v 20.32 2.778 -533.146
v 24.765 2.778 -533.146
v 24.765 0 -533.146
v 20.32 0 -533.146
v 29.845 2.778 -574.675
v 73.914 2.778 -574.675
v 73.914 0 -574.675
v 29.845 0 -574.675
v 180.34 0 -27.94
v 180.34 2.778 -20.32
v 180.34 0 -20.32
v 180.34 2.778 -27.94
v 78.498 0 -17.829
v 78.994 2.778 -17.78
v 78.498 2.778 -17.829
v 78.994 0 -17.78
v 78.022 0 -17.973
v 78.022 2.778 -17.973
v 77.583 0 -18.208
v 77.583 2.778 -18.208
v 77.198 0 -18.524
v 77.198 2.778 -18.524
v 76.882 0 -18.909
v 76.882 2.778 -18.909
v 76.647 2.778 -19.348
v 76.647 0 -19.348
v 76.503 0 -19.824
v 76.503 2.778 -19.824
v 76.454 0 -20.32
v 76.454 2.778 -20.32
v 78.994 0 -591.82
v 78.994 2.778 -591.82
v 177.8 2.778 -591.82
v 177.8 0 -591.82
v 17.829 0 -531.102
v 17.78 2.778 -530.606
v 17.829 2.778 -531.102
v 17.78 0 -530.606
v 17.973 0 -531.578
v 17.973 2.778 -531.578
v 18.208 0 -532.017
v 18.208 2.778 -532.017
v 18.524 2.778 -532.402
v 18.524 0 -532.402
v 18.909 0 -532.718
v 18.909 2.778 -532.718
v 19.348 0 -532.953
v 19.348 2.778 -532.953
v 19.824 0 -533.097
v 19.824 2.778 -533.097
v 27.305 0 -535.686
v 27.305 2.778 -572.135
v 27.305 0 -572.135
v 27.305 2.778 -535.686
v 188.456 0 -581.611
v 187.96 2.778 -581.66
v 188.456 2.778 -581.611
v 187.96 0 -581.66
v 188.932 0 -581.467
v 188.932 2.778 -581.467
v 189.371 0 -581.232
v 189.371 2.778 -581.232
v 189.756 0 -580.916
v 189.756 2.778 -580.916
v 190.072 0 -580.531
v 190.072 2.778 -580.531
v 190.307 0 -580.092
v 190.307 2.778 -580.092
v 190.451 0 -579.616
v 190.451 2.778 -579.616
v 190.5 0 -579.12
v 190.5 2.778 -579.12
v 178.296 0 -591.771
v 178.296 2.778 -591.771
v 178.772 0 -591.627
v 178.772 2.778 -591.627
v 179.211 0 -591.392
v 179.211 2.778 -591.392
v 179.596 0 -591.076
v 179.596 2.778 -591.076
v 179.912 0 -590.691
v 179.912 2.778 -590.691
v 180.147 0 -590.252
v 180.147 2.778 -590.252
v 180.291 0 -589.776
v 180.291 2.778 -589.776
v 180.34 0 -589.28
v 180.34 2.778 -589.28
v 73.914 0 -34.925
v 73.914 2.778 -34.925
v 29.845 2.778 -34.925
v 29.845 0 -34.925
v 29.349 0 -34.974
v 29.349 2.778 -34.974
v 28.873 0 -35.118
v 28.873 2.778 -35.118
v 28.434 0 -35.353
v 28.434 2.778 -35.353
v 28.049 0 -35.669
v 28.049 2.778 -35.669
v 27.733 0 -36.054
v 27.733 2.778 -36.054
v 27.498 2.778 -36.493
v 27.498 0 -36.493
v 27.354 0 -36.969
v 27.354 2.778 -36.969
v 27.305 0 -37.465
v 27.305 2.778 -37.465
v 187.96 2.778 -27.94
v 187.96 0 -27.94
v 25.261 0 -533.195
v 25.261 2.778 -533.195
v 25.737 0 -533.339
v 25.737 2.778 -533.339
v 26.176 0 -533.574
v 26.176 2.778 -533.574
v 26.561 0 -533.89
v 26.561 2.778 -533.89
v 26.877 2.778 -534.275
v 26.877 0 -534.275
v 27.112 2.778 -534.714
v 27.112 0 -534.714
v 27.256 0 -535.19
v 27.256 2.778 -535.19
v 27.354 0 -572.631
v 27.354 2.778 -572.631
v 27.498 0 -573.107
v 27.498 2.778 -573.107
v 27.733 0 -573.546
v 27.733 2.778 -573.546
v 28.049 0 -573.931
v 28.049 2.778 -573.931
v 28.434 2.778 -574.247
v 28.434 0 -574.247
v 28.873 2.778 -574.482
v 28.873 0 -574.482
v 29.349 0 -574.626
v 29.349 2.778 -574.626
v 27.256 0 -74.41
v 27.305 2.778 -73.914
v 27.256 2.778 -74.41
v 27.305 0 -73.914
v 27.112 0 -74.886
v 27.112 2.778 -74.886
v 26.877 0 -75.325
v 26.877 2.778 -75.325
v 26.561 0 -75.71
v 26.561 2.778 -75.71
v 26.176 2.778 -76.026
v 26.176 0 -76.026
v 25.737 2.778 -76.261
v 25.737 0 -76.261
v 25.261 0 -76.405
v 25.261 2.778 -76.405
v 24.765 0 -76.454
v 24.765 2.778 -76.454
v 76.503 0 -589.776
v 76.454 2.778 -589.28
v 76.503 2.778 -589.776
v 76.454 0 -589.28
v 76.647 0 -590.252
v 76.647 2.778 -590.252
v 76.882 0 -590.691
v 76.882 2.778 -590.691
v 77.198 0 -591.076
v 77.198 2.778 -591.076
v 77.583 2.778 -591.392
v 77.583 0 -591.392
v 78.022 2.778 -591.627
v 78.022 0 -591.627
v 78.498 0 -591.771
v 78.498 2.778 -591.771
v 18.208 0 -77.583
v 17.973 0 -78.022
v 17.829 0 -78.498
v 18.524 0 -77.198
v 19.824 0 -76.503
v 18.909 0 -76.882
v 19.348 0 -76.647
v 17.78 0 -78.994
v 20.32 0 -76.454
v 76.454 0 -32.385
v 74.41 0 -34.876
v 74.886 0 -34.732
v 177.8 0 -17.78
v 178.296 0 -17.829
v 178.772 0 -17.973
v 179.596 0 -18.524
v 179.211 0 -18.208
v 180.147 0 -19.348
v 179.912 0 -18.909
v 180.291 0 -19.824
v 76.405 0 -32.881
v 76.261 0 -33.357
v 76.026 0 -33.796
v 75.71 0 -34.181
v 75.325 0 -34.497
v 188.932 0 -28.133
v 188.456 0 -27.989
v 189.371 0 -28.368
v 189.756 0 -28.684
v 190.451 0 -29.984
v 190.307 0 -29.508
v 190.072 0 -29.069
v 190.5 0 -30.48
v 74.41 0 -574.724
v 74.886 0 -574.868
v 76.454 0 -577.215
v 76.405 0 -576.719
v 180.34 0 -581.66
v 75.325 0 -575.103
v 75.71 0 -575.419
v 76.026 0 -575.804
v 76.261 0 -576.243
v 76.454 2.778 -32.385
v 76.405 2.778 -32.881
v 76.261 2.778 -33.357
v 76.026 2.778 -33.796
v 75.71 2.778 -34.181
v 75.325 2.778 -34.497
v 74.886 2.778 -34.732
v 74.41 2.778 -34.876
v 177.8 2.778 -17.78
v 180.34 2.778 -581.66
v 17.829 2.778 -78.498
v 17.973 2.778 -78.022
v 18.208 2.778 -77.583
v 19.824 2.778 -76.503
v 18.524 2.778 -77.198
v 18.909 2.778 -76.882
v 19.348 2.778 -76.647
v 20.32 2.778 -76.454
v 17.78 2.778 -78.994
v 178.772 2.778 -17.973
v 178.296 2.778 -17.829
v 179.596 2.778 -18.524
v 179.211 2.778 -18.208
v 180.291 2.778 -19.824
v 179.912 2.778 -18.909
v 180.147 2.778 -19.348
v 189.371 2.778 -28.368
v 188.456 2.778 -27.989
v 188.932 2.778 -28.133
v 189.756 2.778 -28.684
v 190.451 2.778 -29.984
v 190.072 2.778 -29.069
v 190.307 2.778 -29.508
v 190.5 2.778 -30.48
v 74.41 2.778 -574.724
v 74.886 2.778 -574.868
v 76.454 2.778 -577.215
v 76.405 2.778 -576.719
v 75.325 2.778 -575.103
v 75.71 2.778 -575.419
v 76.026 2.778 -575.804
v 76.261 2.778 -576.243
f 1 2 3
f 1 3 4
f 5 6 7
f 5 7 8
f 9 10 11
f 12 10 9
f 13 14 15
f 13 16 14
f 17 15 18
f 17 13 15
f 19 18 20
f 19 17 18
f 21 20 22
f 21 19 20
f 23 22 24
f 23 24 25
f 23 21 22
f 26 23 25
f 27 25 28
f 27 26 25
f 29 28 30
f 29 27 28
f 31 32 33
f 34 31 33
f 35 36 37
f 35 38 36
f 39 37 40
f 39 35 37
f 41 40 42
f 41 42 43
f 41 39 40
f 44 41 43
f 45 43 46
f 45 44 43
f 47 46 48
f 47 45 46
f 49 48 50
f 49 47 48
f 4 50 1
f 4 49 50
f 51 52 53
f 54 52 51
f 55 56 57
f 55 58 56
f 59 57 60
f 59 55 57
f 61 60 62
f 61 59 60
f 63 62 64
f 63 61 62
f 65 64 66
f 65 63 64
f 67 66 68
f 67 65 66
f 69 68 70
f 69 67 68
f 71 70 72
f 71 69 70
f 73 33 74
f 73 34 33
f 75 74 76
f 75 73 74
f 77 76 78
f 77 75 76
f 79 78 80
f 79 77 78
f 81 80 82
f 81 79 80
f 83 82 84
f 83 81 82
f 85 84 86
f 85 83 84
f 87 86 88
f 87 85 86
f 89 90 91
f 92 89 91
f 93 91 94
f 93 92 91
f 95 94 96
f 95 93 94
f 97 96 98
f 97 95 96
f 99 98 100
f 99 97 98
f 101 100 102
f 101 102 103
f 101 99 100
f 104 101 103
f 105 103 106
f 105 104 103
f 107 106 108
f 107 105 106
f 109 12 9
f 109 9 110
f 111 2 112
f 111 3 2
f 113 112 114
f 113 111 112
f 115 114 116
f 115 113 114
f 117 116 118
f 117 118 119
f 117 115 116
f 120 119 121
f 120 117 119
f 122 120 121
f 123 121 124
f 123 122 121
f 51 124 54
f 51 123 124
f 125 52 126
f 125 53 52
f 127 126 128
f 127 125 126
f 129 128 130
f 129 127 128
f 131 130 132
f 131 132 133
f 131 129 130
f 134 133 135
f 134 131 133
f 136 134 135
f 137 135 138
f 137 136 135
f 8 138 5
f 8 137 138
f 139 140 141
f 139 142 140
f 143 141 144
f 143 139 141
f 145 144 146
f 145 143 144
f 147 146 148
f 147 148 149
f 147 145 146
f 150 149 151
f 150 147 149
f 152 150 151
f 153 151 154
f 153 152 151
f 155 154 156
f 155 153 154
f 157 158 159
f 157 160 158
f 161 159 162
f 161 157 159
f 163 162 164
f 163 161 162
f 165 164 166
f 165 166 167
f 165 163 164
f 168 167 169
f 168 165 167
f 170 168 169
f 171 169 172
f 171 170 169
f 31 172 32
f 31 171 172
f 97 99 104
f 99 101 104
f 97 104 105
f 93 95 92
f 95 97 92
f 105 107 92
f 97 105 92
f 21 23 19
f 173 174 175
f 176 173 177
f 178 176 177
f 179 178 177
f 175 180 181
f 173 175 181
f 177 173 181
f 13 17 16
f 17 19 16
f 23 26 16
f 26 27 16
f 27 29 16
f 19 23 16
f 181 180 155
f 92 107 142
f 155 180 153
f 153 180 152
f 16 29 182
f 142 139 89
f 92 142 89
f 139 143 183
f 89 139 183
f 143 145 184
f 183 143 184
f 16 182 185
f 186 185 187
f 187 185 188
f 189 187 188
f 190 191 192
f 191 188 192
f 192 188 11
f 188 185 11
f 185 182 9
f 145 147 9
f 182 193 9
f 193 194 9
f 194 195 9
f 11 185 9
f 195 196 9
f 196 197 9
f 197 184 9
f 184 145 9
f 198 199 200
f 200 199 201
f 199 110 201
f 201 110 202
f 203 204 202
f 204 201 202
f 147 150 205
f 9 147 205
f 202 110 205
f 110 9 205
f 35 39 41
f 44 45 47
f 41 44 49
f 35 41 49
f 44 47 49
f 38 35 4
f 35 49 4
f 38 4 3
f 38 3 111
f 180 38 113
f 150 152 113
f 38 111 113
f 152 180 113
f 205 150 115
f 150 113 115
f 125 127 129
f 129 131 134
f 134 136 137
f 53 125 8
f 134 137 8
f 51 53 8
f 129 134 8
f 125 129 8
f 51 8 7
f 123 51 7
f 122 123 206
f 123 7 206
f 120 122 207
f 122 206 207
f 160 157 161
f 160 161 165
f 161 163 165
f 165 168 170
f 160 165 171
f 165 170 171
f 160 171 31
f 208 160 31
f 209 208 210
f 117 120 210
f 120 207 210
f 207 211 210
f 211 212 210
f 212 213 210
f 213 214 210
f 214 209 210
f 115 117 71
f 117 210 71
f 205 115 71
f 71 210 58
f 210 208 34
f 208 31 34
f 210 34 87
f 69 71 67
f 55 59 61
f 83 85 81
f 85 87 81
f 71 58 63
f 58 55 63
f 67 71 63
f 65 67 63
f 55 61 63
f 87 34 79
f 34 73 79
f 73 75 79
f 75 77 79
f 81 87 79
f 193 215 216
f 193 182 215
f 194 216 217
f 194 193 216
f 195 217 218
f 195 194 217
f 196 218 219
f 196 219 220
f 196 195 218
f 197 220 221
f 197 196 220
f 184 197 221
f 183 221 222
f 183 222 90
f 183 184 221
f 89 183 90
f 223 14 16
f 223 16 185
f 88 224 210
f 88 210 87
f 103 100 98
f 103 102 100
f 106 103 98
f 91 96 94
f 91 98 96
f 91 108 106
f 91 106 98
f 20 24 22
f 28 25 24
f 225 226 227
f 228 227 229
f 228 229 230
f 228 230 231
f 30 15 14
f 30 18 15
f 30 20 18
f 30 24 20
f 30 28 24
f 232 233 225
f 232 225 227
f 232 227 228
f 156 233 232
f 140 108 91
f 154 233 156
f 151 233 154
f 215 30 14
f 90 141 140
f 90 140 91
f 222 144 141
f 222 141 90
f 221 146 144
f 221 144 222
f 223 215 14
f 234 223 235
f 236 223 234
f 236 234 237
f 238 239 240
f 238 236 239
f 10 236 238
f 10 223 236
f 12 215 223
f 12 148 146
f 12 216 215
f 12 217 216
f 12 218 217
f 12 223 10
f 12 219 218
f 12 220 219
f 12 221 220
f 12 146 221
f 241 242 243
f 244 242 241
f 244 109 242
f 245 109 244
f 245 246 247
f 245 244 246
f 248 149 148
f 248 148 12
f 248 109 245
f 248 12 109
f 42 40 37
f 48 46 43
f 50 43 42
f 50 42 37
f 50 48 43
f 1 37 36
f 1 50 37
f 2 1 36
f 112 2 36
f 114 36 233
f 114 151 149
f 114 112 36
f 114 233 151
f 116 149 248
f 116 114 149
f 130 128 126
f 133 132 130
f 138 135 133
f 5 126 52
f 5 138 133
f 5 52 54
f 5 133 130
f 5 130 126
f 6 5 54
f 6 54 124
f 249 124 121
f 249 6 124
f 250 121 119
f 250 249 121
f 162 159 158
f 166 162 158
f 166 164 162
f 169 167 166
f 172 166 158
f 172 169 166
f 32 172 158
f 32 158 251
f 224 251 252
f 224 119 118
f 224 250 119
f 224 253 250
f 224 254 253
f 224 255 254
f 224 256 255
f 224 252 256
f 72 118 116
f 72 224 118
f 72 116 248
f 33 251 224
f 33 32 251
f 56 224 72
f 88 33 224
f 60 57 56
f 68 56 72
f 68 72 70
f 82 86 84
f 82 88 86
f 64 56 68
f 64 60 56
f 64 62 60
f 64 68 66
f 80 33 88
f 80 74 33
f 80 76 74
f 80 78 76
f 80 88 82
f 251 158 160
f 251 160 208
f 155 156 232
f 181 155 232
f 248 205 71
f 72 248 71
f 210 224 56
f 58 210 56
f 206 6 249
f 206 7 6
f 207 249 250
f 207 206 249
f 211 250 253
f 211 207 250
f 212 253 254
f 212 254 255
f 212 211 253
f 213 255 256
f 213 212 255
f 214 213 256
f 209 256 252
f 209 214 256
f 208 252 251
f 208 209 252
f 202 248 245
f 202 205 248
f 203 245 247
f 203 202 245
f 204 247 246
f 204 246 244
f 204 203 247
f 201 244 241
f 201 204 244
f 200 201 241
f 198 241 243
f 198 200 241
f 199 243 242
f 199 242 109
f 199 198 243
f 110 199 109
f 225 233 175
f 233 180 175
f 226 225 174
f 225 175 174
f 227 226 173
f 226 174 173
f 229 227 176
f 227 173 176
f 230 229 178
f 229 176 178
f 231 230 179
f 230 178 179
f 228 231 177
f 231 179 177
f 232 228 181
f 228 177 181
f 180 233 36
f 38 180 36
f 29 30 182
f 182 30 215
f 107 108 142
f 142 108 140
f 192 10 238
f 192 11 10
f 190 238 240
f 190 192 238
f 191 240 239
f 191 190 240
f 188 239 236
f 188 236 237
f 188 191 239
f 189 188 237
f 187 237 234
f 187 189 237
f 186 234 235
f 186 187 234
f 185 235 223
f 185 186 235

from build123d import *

# Parameters (mm, degrees)
SKETCH1_W           = 190.5
SKETCH1_H           = 609.6
BOSS_EXTRUDE1_DEPTH = 2.778125
SKETCH2_W           = 190.5
SKETCH2_H           = 17.78
CUT_EXTRUDE1_DEPTH  = 3.778125
SKETCH3_W           = 17.78
SKETCH3_H           = 574.04
CUT_EXTRUDE2_DEPTH  = 3.778125
SKETCH4_W           = 10.16
SKETCH4_H           = 10.16
CUT_EXTRUDE3_DEPTH  = 3.778125
FILLET1_R           = 2.54


with BuildPart() as part:
    # Sketch1 → Boss-Extrude1 (new body)
    with BuildSketch(Plane(origin=(0, 0, 0), x_dir=(1, 0, 0), z_dir=(0, 1, 0))):
        with Locations((95.25, 304.8)):
            Rectangle(SKETCH1_W, SKETCH1_H)
    extrude(amount=BOSS_EXTRUDE1_DEPTH)

    # Sketch2 → Cut-Extrude1 (cut, through all)
    with BuildSketch(Plane(origin=(0, 2.778125, 0), x_dir=(1, 0, 0), z_dir=(0, 1, 0))):
        with Locations((95.25, 8.89)):
            Rectangle(SKETCH2_W, SKETCH2_H)
        with Locations((95.25, 600.71)):
            Rectangle(SKETCH2_W, SKETCH2_H)
    extrude(amount=-CUT_EXTRUDE1_DEPTH, mode=Mode.SUBTRACT)

    # Sketch3 → Cut-Extrude2 (cut, through all)
    with BuildSketch(Plane(origin=(0, 2.778125, 0), x_dir=(1, 0, 0), z_dir=(0, 1, 0))):
        with Locations((8.89, 304.8)):
            Rectangle(SKETCH3_W, SKETCH3_H)
    extrude(amount=-CUT_EXTRUDE2_DEPTH, mode=Mode.SUBTRACT)

    # Sketch4 → Cut-Extrude3 (cut, through all)
    with BuildSketch(Plane(origin=(0, 2.778125, 0), x_dir=(1, 0, 0), z_dir=(0, 1, 0))):
        Polygon((17.78, 591.82), (76.454, 591.82), (76.454, 574.675), (27.305, 574.675), (27.305, 533.146), (17.78, 533.146), align=None)
        Polygon((17.78, 17.78), (76.454, 17.78), (76.454, 34.925), (27.305, 34.925), (27.305, 76.454), (17.78, 76.454), align=None)
        with Locations((185.42, 586.74)):
            Rectangle(SKETCH4_W, SKETCH4_H)
        with Locations((185.42, 22.86)):
            Rectangle(SKETCH4_W, SKETCH4_H)
    extrude(amount=-CUT_EXTRUDE3_DEPTH, mode=Mode.SUBTRACT)

    # Fillet1
    fillet1_edges = [part.edges().sort_by_distance(p)[0] for p in [
        (17.78, 1.3890625, -76.454),
        (27.305, 1.3890625, -76.454),
        (27.305, 1.3890625, -34.925),
        (76.454, 1.3890625, -34.925),
        (76.454, 1.3890625, -17.78),
        (190.5, 1.3890625, -581.66),
        (180.34, 1.3890625, -591.82),
        (190.5, 1.3890625, -27.94),
        (180.34, 1.3890625, -17.78),
        (17.78, 1.3890625, -533.146),
        (76.454, 1.3890625, -591.82),
        (76.454, 1.3890625, -574.675),
        (27.305, 1.3890625, -574.675),
        (27.305, 1.3890625, -533.146),
    ]]
    fillet(fillet1_edges, radius=FILLET1_R)


solid = part.part
